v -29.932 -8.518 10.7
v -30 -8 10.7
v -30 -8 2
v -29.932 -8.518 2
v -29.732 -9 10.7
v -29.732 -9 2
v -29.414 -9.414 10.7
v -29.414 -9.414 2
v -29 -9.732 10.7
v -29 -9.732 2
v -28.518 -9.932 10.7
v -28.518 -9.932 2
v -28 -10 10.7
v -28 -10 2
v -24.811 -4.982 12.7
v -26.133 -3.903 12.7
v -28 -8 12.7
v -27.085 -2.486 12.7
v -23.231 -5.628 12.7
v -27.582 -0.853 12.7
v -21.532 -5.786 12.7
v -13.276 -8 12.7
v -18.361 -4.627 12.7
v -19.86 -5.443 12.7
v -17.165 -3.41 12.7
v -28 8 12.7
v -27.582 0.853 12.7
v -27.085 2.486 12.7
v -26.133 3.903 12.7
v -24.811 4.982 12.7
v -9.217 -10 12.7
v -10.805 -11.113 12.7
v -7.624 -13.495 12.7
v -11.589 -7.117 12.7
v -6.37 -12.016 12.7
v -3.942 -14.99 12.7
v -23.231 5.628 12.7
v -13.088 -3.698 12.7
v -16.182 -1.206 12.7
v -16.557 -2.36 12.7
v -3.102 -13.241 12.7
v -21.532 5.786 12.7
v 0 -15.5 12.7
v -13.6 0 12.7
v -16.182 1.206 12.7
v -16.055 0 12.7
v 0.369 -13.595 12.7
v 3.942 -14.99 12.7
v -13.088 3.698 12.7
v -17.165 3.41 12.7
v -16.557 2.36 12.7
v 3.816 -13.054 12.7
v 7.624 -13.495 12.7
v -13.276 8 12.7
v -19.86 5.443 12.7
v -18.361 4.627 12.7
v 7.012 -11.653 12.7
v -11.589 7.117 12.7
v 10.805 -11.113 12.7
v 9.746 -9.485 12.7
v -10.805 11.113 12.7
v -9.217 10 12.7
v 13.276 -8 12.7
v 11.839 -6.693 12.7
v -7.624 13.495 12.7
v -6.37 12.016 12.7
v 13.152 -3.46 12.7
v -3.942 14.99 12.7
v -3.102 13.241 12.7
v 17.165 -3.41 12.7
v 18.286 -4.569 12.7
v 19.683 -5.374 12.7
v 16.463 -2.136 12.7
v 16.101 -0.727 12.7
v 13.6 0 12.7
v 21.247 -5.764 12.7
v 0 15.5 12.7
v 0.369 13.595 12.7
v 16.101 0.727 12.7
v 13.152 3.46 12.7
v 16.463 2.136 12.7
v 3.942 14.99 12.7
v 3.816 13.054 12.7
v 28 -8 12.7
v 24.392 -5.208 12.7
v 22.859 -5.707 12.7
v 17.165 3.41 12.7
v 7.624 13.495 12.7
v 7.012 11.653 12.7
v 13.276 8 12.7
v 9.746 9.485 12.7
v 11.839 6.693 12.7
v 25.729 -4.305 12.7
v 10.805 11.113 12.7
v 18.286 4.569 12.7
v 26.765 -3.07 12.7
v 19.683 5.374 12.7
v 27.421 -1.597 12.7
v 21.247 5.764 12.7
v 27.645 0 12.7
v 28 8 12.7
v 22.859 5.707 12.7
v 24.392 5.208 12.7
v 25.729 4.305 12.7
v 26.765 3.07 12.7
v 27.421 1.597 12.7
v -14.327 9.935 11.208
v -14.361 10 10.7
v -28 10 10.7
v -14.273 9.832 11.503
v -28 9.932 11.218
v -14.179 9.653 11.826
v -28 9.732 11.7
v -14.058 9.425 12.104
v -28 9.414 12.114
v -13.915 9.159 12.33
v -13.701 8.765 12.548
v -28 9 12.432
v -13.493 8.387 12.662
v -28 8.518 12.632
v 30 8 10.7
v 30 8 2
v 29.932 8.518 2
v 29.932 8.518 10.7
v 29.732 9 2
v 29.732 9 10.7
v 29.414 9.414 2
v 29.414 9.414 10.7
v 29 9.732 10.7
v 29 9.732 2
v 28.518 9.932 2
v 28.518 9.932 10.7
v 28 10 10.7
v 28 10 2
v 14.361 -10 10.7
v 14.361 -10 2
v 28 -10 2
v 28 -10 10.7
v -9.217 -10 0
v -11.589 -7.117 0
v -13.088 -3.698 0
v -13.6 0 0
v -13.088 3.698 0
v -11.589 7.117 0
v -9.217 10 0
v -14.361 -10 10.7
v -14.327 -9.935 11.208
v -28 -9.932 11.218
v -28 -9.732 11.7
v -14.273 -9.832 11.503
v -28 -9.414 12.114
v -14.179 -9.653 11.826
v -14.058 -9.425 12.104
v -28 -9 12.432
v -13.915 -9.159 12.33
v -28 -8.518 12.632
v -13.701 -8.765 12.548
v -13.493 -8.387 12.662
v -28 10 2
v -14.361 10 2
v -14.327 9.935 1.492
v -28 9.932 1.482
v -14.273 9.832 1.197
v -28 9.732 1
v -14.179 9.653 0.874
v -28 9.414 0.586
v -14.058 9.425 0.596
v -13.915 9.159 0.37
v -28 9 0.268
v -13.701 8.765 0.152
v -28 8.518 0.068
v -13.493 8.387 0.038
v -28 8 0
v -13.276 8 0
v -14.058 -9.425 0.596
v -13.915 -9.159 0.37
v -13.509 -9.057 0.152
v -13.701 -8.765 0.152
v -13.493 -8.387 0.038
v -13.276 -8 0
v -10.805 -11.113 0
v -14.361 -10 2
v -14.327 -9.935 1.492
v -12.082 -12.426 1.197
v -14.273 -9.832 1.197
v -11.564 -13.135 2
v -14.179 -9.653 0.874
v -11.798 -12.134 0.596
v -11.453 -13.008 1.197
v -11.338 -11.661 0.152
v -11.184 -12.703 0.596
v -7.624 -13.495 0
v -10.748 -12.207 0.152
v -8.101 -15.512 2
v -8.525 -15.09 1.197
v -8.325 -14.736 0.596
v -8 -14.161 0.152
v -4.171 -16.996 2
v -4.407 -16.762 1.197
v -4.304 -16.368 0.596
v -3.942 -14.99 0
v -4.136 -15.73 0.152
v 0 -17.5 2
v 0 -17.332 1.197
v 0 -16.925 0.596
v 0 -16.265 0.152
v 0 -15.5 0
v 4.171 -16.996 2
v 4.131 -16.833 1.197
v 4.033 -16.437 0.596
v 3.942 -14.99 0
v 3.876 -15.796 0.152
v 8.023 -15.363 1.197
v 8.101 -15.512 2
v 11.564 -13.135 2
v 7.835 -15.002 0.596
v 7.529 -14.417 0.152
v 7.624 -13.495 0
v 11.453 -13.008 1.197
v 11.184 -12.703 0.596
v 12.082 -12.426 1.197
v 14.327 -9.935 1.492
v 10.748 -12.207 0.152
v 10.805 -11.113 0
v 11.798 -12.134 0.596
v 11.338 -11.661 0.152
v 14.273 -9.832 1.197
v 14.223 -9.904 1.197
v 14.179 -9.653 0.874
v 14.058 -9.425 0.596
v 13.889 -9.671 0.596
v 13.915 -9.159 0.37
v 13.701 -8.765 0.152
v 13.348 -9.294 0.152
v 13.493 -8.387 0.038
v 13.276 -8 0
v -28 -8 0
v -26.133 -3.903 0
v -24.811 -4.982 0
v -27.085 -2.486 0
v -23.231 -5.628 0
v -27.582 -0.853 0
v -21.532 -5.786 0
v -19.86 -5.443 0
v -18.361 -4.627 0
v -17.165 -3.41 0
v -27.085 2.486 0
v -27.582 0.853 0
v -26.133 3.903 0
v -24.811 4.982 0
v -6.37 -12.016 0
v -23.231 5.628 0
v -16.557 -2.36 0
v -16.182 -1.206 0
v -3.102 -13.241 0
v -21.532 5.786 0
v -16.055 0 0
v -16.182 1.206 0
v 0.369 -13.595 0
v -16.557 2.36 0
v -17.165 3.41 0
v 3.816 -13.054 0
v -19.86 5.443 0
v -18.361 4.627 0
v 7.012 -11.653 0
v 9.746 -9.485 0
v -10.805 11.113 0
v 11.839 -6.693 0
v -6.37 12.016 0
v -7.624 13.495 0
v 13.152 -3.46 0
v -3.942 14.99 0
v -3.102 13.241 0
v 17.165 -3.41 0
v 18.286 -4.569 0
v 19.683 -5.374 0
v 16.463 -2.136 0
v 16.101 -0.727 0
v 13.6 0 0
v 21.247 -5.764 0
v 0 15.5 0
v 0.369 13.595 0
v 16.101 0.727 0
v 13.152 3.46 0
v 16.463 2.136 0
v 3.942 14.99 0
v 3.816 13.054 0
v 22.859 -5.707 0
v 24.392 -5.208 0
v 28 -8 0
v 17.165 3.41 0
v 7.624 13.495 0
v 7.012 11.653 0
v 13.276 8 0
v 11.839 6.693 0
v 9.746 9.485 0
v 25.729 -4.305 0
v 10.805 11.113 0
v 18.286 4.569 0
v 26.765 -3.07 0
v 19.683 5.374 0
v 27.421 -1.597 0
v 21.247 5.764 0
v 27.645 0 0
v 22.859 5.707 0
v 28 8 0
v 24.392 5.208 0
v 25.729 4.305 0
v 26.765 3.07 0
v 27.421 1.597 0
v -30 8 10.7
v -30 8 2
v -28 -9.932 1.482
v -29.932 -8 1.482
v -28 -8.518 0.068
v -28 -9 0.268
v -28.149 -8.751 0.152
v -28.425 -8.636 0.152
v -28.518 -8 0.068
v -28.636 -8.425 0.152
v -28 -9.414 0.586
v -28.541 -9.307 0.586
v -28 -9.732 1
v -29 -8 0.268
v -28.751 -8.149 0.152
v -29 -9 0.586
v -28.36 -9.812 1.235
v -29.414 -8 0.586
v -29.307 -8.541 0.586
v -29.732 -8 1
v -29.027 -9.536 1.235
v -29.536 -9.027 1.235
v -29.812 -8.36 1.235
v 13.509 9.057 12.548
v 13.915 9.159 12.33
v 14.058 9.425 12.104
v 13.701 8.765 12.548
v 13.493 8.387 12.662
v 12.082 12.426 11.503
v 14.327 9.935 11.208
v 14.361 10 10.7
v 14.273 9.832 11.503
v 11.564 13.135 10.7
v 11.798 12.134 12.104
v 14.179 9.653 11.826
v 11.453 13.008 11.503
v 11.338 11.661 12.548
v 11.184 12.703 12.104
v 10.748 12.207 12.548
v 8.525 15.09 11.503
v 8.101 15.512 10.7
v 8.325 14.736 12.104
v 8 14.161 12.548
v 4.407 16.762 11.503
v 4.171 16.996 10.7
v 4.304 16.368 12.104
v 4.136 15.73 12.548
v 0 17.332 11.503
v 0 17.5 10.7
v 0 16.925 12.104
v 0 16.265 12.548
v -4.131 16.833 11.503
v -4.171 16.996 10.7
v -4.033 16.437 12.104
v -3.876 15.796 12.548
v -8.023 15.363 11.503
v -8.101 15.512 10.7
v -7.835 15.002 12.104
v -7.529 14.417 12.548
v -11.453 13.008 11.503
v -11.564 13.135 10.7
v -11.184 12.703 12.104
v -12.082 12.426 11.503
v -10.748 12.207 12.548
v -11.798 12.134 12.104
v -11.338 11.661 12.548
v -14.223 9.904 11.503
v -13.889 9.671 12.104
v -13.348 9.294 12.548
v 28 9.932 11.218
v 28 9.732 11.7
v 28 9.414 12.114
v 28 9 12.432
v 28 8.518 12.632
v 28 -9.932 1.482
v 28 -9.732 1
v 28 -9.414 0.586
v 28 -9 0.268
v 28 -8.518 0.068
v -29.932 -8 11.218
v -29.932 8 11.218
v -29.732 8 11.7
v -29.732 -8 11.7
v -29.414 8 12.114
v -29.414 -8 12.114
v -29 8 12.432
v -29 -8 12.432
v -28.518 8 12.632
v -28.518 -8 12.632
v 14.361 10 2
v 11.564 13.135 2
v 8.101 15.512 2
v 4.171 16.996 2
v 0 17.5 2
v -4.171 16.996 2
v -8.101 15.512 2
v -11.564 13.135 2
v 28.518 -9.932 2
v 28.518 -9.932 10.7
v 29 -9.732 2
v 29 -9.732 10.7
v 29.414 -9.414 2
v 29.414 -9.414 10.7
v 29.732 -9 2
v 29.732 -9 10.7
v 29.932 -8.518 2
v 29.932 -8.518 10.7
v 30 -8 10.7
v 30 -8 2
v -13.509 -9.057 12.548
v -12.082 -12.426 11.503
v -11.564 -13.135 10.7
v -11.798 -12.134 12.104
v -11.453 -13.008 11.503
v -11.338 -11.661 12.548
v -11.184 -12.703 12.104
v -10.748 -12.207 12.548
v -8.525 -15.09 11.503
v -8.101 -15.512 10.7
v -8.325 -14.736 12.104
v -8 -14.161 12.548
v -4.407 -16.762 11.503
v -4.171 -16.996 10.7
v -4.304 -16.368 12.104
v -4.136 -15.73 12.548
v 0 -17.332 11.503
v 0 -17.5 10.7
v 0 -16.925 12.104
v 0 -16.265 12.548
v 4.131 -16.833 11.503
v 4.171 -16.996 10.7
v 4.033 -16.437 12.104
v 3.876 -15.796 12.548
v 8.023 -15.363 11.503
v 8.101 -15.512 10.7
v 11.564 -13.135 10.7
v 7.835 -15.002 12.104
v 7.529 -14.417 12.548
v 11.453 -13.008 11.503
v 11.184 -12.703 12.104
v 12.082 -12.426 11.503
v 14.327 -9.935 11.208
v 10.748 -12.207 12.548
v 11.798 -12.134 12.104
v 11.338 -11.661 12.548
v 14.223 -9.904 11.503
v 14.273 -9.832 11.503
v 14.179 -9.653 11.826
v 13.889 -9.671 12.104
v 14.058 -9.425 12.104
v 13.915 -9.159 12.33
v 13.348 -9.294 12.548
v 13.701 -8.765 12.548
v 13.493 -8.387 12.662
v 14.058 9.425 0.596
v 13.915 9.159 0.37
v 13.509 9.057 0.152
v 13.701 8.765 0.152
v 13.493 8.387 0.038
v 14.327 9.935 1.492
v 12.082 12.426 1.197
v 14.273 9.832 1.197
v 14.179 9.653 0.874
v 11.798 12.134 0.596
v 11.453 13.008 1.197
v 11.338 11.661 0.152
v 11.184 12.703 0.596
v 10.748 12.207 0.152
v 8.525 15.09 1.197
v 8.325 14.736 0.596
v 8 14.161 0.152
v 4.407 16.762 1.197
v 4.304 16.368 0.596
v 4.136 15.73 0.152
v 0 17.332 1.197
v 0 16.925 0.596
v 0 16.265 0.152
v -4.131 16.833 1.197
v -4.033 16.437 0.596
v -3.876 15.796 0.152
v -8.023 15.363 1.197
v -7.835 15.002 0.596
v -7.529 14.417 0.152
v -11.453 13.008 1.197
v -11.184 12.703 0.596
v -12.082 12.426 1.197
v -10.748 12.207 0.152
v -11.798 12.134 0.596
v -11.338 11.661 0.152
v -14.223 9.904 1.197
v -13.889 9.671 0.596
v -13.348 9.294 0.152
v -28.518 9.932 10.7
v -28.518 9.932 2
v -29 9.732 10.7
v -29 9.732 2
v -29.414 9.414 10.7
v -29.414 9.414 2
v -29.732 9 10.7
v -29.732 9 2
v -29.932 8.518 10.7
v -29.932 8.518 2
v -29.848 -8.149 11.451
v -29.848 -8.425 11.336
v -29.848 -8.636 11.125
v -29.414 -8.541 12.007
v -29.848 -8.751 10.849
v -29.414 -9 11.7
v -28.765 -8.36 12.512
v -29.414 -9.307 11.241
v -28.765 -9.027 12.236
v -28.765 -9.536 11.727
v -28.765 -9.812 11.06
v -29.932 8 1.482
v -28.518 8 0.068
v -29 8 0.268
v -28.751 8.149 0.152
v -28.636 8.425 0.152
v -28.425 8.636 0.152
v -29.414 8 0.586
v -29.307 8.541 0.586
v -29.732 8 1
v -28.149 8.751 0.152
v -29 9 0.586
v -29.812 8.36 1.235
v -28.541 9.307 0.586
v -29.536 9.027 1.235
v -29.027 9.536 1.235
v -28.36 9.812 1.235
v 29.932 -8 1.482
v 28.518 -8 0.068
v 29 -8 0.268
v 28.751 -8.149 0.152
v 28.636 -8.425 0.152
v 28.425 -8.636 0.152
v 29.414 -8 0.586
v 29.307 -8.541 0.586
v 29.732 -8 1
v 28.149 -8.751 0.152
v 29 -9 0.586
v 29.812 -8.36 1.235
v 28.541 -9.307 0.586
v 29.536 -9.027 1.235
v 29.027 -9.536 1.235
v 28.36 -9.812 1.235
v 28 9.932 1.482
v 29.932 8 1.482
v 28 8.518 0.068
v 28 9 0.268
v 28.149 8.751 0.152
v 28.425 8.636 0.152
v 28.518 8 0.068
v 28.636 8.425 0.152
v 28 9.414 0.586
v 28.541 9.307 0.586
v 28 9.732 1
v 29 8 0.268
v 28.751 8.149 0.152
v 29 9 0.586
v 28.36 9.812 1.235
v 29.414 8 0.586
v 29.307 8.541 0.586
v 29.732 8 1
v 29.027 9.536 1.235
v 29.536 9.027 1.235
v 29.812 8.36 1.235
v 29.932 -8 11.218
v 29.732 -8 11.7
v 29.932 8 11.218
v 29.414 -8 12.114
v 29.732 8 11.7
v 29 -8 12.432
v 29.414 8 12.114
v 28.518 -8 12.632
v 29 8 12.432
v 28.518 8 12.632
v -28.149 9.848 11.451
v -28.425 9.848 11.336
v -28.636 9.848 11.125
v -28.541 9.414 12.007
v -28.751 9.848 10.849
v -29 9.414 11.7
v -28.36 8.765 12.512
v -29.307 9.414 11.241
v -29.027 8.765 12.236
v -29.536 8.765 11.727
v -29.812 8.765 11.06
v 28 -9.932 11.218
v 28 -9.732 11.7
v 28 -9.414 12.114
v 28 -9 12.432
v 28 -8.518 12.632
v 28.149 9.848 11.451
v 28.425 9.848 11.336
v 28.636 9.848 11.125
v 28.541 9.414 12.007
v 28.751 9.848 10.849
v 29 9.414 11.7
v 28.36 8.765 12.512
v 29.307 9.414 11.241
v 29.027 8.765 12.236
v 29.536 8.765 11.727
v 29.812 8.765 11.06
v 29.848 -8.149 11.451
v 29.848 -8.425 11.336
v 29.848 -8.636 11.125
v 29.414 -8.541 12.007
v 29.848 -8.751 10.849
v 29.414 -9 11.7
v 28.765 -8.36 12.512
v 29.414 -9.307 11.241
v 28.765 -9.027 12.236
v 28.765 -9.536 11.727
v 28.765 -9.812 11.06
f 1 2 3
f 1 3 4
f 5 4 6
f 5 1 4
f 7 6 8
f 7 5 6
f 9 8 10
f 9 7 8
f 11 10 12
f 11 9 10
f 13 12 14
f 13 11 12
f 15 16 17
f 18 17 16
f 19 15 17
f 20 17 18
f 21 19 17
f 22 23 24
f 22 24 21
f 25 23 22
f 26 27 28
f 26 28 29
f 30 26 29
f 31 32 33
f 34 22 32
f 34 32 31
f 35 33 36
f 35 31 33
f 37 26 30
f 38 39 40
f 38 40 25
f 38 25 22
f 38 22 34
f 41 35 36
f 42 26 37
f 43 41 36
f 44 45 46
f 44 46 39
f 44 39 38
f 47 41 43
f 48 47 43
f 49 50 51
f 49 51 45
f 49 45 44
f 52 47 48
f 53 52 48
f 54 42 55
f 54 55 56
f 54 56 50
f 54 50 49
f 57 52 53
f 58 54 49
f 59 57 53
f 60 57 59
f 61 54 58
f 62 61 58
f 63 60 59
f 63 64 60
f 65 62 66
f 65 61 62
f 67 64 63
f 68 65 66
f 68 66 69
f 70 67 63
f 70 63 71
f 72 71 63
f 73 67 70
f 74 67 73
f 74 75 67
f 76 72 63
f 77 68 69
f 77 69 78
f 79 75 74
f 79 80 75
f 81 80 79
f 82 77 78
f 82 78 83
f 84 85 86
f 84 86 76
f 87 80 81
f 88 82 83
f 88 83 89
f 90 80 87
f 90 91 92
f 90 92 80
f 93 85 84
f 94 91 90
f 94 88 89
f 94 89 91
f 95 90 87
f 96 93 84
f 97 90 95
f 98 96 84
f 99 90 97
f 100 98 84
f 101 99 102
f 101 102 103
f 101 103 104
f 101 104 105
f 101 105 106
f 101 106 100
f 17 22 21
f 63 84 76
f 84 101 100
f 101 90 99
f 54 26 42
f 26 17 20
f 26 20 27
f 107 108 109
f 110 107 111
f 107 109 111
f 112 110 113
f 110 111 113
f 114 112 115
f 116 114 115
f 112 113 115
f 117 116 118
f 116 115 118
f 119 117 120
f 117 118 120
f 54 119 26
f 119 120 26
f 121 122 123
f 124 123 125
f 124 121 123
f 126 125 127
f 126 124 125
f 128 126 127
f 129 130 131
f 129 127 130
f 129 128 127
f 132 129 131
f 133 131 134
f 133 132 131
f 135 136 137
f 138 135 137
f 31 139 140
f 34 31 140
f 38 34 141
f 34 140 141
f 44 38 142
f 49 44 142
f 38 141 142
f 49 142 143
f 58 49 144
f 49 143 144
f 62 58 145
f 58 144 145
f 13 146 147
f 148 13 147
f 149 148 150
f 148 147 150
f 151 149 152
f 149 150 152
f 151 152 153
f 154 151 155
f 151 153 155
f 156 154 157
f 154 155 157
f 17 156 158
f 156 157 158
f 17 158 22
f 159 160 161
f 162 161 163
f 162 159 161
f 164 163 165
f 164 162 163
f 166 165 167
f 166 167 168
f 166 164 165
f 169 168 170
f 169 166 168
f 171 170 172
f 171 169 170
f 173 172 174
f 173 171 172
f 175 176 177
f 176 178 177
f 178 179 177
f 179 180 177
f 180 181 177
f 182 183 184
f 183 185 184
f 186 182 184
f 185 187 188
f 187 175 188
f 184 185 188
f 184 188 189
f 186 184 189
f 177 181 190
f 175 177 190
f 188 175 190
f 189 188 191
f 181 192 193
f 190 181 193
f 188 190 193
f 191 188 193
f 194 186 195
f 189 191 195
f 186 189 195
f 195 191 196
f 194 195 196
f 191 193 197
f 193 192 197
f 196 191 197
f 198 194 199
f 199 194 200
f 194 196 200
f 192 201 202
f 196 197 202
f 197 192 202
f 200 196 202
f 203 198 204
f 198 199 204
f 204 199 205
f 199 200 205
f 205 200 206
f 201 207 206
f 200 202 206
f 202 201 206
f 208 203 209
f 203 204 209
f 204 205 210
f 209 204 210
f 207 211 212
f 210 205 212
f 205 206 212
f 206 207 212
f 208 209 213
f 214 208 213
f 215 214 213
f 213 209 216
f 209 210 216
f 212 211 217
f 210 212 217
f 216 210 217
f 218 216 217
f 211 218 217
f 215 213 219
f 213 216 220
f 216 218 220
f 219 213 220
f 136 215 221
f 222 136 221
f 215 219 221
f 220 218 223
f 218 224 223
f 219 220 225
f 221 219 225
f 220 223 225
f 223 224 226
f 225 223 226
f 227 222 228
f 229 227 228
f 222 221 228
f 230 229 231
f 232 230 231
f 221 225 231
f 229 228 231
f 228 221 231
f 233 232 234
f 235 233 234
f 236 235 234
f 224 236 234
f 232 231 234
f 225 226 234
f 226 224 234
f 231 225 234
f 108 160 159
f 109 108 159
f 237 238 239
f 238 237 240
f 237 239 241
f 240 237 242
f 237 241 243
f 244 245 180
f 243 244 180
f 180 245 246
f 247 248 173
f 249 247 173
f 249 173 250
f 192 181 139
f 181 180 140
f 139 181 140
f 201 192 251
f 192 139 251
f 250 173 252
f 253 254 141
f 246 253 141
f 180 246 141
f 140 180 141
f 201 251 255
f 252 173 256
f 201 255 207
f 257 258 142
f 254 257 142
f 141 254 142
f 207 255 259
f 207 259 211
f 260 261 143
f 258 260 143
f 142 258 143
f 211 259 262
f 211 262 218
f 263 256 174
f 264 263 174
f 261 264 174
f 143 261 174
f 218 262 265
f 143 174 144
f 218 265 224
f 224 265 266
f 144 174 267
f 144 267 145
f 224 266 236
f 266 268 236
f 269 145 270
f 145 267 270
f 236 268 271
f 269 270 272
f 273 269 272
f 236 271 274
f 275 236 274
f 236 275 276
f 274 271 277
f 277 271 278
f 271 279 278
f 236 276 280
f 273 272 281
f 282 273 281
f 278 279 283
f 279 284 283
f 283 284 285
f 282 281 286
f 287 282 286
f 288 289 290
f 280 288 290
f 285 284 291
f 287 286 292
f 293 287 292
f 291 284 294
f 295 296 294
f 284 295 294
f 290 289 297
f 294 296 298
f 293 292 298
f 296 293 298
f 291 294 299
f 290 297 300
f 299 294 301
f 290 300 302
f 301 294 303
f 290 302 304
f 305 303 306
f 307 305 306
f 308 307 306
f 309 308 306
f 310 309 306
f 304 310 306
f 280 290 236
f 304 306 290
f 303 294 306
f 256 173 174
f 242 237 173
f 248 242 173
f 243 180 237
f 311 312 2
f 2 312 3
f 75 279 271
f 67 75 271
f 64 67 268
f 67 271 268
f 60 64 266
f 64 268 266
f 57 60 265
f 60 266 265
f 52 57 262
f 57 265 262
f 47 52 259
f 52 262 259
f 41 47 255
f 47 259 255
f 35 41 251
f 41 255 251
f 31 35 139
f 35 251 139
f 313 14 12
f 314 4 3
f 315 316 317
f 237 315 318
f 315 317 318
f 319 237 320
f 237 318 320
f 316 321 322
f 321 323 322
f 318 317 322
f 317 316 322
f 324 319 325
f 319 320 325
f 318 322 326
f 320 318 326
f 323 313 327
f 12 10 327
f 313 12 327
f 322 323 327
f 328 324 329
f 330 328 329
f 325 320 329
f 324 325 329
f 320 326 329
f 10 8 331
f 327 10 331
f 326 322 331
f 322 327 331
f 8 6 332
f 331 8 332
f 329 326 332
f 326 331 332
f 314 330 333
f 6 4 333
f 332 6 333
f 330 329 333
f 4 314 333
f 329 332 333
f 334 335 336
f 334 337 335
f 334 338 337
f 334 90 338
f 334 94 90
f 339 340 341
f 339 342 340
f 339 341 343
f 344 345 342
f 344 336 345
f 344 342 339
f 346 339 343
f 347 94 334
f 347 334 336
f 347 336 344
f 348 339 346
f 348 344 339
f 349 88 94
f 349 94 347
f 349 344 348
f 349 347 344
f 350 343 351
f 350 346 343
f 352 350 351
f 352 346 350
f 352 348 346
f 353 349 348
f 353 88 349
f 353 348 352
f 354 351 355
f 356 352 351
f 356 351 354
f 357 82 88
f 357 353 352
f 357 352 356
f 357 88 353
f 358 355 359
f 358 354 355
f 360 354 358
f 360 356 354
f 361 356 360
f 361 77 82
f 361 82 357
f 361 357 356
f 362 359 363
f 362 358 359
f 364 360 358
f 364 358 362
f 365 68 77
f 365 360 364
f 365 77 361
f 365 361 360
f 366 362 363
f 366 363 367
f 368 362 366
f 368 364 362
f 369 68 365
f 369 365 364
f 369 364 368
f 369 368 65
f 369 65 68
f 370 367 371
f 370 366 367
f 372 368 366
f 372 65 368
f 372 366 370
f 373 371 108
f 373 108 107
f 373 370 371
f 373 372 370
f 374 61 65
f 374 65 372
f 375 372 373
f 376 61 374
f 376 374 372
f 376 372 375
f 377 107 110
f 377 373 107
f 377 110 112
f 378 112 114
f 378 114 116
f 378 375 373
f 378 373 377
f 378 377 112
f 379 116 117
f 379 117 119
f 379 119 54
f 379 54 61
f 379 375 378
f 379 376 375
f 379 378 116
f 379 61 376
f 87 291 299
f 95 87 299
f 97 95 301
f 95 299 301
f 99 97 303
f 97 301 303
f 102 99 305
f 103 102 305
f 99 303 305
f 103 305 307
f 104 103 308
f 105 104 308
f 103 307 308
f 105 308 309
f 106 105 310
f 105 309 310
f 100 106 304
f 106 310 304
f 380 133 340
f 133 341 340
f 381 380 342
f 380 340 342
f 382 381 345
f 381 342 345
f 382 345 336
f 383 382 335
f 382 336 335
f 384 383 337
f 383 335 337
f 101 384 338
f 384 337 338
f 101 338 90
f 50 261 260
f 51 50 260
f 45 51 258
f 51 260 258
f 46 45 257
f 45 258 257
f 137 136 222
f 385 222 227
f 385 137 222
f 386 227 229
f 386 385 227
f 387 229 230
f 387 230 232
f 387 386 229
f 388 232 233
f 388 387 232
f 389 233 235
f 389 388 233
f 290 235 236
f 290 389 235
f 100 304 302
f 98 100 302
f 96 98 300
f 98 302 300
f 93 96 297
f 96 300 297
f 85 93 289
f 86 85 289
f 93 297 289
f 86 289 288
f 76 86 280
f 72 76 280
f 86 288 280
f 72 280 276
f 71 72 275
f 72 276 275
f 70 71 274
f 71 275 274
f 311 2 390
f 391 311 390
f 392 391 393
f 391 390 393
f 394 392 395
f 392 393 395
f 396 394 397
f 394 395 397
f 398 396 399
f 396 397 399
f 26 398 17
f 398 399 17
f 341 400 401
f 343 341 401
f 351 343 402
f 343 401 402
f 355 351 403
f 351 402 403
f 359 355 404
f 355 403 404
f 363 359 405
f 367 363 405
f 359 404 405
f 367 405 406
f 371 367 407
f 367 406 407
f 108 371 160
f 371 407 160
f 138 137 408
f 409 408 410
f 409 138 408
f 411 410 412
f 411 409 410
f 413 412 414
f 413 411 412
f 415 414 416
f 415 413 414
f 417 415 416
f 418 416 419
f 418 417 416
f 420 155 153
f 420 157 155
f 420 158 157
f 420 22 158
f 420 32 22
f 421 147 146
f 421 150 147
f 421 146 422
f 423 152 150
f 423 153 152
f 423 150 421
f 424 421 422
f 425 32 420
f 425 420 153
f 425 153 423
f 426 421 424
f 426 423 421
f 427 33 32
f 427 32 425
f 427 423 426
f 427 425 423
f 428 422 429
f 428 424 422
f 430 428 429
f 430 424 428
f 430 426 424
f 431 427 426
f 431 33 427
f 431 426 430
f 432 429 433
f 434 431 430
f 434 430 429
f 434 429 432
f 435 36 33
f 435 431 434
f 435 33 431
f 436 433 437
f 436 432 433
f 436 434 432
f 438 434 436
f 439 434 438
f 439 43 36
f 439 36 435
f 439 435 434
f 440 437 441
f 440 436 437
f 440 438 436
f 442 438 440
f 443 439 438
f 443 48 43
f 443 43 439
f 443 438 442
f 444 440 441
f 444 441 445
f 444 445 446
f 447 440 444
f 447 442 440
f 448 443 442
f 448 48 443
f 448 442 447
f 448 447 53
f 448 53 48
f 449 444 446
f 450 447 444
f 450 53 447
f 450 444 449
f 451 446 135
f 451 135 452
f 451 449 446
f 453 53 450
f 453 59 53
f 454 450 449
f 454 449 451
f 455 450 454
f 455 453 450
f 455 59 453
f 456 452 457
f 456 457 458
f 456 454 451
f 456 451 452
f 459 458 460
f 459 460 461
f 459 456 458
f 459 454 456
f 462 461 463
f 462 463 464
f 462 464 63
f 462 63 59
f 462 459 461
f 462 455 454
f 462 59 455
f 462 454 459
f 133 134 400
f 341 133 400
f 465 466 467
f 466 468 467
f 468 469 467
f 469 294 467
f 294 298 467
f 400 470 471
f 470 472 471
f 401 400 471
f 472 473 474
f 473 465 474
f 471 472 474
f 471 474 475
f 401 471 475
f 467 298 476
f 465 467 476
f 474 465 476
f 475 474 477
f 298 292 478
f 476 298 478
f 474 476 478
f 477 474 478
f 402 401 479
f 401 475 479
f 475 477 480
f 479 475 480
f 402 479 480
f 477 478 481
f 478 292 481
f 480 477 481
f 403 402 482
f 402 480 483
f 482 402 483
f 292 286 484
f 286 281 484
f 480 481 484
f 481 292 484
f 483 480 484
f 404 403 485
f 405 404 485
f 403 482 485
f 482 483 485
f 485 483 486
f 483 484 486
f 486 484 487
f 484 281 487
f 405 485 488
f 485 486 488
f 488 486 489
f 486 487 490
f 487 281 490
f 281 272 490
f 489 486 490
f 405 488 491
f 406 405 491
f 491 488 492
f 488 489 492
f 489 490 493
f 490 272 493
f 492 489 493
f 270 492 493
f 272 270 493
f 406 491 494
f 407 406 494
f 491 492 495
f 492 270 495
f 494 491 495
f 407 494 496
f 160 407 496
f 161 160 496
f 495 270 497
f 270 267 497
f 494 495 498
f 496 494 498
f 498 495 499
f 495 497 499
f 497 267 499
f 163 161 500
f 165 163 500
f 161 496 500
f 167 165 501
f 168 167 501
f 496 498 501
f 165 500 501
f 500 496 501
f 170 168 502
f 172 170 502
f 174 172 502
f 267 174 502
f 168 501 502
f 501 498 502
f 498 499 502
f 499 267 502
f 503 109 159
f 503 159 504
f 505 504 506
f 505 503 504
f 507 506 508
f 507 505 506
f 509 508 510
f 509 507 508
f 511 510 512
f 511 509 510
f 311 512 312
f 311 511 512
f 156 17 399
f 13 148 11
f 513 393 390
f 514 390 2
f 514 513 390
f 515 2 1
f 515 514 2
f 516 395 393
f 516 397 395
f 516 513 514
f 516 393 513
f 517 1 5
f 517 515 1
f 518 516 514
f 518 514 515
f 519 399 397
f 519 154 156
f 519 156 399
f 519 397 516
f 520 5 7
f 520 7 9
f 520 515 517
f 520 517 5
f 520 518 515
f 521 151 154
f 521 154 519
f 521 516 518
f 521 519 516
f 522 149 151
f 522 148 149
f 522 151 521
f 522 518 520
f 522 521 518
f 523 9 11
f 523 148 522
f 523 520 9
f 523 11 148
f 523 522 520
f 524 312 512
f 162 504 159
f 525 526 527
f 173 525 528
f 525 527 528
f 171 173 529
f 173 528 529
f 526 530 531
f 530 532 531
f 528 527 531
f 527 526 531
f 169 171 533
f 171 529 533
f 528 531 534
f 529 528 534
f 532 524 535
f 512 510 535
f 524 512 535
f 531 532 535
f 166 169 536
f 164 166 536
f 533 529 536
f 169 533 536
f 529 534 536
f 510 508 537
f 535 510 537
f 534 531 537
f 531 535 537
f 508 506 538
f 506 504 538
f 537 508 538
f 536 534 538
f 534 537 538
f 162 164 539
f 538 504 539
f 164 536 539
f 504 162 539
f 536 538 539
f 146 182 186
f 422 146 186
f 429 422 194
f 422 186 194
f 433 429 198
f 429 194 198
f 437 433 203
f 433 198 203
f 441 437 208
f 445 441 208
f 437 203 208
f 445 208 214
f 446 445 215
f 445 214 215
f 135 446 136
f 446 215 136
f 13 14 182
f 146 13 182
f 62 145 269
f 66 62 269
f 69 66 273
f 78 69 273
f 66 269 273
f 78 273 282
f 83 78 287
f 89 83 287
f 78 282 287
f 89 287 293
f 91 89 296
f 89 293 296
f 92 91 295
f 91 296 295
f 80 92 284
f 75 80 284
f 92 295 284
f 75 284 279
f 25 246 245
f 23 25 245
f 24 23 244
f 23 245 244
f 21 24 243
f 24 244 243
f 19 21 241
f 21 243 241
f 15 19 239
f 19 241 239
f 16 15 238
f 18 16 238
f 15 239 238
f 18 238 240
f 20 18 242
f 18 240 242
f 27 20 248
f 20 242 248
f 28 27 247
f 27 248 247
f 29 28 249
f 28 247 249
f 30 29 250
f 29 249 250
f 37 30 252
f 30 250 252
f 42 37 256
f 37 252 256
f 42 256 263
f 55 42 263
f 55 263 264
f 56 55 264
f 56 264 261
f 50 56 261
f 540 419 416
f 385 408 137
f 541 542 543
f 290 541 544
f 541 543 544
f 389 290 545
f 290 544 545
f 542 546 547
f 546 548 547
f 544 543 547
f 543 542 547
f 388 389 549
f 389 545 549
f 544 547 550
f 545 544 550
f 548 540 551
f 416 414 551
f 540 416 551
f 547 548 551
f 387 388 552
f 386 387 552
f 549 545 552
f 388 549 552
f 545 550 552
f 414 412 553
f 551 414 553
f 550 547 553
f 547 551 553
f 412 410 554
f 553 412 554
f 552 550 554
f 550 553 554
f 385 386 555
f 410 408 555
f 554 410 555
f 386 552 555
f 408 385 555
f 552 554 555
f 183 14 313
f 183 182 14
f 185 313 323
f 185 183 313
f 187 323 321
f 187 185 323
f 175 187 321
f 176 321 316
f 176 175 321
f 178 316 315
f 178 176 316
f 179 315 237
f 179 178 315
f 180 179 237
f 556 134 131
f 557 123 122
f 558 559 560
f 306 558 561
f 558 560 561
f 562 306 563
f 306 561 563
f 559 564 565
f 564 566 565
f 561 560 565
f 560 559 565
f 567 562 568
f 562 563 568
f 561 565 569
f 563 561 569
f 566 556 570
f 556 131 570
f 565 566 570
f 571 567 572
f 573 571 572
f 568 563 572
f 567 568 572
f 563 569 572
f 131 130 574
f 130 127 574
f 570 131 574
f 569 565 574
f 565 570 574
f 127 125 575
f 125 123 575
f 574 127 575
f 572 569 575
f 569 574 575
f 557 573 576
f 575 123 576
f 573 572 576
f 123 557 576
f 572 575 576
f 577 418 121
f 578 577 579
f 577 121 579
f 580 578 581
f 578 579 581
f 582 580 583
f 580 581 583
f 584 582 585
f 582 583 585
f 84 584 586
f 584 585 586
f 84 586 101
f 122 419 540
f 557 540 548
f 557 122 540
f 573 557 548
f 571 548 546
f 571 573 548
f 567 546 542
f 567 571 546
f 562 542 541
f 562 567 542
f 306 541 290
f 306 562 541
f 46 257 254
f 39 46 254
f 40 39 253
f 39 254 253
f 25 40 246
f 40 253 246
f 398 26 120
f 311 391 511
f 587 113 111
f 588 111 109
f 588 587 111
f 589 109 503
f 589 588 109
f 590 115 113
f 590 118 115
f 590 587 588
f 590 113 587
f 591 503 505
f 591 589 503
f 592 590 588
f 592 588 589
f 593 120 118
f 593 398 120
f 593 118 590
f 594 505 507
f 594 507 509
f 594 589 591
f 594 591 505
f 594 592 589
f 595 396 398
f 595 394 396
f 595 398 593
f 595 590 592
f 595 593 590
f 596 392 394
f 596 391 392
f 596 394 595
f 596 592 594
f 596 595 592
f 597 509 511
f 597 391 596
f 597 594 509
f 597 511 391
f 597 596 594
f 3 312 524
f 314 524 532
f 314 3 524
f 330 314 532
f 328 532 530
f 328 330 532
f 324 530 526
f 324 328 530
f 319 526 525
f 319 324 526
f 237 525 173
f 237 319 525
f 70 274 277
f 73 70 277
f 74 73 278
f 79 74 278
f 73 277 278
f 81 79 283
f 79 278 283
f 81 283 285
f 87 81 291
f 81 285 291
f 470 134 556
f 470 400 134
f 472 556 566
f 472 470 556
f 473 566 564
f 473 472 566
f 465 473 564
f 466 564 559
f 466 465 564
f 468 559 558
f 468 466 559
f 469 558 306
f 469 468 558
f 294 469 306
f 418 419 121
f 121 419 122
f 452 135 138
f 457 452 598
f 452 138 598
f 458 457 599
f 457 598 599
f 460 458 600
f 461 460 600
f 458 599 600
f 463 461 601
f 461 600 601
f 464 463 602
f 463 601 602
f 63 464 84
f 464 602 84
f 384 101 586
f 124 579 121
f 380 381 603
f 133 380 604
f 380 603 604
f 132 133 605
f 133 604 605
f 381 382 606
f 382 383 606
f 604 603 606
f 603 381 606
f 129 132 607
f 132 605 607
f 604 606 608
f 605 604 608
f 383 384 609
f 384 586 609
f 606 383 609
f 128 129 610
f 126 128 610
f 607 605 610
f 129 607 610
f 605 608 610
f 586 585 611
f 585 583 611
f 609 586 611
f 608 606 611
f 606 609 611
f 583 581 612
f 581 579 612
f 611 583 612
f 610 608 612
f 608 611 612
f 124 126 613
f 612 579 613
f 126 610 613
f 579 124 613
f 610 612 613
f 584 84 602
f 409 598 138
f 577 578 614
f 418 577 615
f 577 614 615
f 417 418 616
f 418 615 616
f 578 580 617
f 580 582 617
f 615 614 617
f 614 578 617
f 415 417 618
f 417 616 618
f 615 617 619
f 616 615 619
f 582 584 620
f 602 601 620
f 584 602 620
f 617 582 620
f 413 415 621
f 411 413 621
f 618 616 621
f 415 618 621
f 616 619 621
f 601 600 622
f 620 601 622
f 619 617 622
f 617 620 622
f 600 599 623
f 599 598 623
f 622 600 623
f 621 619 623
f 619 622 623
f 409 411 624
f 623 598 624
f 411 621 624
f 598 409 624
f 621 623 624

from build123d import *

# Parameters (mm, degrees)
F1_DEPTH = 12.7
F2_R     = 2


with BuildPart() as f1:
    # F0 (on Top) → F1 (new body)
    with BuildSketch(Plane.XY):
        with BuildLine():
            ThreePointArc((-17.164541762, -3.4100595449), (-16.1036698951, -6.8499500663), (-14.3614066163, -10))
            Line((-14.3614066163, -10), (-9.2173748974, -10))
            ThreePointArc((-9.2173748974, -10), (-13.6, 0), (-9.2173748974, 10))
            Line((-9.2173748974, 10), (-14.3614066163, 10))
            ThreePointArc((-14.3614066163, 10), (-16.1036698951, 6.8499500663), (-17.164541762, 3.4100595449))
            ThreePointArc((-17.164541762, 3.4100595449), (-16.3393623105, 1.7930134566), (-16.055, 0))
            ThreePointArc((-16.055, 0), (-16.3393623105, -1.7930134566), (-17.164541762, -3.4100595449))
        make_face()
        with BuildLine():
            Line((9.2173748974, 10), (14.3614066163, 10))
            ThreePointArc((14.3614066163, 10), (0, 17.5), (-14.3614066163, 10))
            Line((-14.3614066163, 10), (-9.2173748974, 10))
            ThreePointArc((-9.2173748974, 10), (0, 13.6), (9.2173748974, 10))
        make_face()
        with BuildLine():
            ThreePointArc((-14.3614066163, -10), (0, -17.5), (14.3614066163, -10))
            Line((14.3614066163, -10), (9.2173748974, -10))
            ThreePointArc((9.2173748974, -10), (0, -13.6), (-9.2173748974, -10))
            Line((-9.2173748974, -10), (-14.3614066163, -10))
        make_face()
        with BuildLine():
            Line((9.2173748974, -10), (14.3614066163, -10))
            ThreePointArc((14.3614066163, -10), (16.1036698951, -6.8499500663), (17.164541762, -3.4100595449))
            ThreePointArc((17.164541762, -3.4100595449), (16.055, 0), (17.164541762, 3.4100595449))
            ThreePointArc((17.164541762, 3.4100595449), (16.1036698951, 6.8499500663), (14.3614066163, 10))
            Line((14.3614066163, 10), (9.2173748974, 10))
            ThreePointArc((9.2173748974, 10), (12.4562494075, 5.4591071337), (13.6, 0))
            ThreePointArc((13.6, 0), (12.4562494075, -5.4591071337), (9.2173748974, -10))
        make_face()
        with BuildLine():
            Line((14.3614066163, -10), (30, -10))
            Line((30, -10), (30, 10))
            Line((30, 10), (14.3614066163, 10))
            ThreePointArc((14.3614066163, 10), (16.1036698951, 6.8499500663), (17.164541762, 3.4100595449))
            ThreePointArc((17.164541762, 3.4100595449), (23.6430134566, 5.5106376895), (27.645, 0))
            ThreePointArc((27.645, 0), (23.6430134566, -5.5106376895), (17.164541762, -3.4100595449))
            ThreePointArc((17.164541762, -3.4100595449), (16.1036698951, -6.8499500663), (14.3614066163, -10))
        make_face()
        with BuildLine():
            Line((-30, -10), (-14.3614066163, -10))
            ThreePointArc((-14.3614066163, -10), (-16.1036698951, -6.8499500663), (-17.164541762, -3.4100595449))
            ThreePointArc((-17.164541762, -3.4100595449), (-27.645, 0), (-17.164541762, 3.4100595449))
            ThreePointArc((-17.164541762, 3.4100595449), (-16.1036698951, 6.8499500663), (-14.3614066163, 10))
            Line((-14.3614066163, 10), (-30, 10))
            Line((-30, 10), (-30, -10))
        make_face()
    extrude(amount=F1_DEPTH)

    # F2
    f2_edges = [f1.edges().sort_by_distance(p)[0] for p in [
        (-22.180703, -10, 12.7),
        (0, -17.5, 12.7),
        (22.180703, -10, 12.7),
        (30, 0, 12.7),
        (-30, 0, 12.7),
        (-22.180703, 10, 12.7),
        (0, 17.5, 12.7),
        (22.180703, 10, 12.7),
        (30, 10, 6.35),
        (-30, 10, 6.35),
        (-30, -10, 6.35),
        (30, -10, 6.35),
        (0, -17.5, 0),
        (-22.180703, -10, 0),
        (-30, 0, 0),
        (-22.180703, 10, 0),
        (0, 17.5, 0),
        (22.180703, 10, 0),
        (30, 0, 0),
        (22.180703, -10, 0),
    ]]
    fillet(f2_edges, radius=F2_R)


solid = f1.part
